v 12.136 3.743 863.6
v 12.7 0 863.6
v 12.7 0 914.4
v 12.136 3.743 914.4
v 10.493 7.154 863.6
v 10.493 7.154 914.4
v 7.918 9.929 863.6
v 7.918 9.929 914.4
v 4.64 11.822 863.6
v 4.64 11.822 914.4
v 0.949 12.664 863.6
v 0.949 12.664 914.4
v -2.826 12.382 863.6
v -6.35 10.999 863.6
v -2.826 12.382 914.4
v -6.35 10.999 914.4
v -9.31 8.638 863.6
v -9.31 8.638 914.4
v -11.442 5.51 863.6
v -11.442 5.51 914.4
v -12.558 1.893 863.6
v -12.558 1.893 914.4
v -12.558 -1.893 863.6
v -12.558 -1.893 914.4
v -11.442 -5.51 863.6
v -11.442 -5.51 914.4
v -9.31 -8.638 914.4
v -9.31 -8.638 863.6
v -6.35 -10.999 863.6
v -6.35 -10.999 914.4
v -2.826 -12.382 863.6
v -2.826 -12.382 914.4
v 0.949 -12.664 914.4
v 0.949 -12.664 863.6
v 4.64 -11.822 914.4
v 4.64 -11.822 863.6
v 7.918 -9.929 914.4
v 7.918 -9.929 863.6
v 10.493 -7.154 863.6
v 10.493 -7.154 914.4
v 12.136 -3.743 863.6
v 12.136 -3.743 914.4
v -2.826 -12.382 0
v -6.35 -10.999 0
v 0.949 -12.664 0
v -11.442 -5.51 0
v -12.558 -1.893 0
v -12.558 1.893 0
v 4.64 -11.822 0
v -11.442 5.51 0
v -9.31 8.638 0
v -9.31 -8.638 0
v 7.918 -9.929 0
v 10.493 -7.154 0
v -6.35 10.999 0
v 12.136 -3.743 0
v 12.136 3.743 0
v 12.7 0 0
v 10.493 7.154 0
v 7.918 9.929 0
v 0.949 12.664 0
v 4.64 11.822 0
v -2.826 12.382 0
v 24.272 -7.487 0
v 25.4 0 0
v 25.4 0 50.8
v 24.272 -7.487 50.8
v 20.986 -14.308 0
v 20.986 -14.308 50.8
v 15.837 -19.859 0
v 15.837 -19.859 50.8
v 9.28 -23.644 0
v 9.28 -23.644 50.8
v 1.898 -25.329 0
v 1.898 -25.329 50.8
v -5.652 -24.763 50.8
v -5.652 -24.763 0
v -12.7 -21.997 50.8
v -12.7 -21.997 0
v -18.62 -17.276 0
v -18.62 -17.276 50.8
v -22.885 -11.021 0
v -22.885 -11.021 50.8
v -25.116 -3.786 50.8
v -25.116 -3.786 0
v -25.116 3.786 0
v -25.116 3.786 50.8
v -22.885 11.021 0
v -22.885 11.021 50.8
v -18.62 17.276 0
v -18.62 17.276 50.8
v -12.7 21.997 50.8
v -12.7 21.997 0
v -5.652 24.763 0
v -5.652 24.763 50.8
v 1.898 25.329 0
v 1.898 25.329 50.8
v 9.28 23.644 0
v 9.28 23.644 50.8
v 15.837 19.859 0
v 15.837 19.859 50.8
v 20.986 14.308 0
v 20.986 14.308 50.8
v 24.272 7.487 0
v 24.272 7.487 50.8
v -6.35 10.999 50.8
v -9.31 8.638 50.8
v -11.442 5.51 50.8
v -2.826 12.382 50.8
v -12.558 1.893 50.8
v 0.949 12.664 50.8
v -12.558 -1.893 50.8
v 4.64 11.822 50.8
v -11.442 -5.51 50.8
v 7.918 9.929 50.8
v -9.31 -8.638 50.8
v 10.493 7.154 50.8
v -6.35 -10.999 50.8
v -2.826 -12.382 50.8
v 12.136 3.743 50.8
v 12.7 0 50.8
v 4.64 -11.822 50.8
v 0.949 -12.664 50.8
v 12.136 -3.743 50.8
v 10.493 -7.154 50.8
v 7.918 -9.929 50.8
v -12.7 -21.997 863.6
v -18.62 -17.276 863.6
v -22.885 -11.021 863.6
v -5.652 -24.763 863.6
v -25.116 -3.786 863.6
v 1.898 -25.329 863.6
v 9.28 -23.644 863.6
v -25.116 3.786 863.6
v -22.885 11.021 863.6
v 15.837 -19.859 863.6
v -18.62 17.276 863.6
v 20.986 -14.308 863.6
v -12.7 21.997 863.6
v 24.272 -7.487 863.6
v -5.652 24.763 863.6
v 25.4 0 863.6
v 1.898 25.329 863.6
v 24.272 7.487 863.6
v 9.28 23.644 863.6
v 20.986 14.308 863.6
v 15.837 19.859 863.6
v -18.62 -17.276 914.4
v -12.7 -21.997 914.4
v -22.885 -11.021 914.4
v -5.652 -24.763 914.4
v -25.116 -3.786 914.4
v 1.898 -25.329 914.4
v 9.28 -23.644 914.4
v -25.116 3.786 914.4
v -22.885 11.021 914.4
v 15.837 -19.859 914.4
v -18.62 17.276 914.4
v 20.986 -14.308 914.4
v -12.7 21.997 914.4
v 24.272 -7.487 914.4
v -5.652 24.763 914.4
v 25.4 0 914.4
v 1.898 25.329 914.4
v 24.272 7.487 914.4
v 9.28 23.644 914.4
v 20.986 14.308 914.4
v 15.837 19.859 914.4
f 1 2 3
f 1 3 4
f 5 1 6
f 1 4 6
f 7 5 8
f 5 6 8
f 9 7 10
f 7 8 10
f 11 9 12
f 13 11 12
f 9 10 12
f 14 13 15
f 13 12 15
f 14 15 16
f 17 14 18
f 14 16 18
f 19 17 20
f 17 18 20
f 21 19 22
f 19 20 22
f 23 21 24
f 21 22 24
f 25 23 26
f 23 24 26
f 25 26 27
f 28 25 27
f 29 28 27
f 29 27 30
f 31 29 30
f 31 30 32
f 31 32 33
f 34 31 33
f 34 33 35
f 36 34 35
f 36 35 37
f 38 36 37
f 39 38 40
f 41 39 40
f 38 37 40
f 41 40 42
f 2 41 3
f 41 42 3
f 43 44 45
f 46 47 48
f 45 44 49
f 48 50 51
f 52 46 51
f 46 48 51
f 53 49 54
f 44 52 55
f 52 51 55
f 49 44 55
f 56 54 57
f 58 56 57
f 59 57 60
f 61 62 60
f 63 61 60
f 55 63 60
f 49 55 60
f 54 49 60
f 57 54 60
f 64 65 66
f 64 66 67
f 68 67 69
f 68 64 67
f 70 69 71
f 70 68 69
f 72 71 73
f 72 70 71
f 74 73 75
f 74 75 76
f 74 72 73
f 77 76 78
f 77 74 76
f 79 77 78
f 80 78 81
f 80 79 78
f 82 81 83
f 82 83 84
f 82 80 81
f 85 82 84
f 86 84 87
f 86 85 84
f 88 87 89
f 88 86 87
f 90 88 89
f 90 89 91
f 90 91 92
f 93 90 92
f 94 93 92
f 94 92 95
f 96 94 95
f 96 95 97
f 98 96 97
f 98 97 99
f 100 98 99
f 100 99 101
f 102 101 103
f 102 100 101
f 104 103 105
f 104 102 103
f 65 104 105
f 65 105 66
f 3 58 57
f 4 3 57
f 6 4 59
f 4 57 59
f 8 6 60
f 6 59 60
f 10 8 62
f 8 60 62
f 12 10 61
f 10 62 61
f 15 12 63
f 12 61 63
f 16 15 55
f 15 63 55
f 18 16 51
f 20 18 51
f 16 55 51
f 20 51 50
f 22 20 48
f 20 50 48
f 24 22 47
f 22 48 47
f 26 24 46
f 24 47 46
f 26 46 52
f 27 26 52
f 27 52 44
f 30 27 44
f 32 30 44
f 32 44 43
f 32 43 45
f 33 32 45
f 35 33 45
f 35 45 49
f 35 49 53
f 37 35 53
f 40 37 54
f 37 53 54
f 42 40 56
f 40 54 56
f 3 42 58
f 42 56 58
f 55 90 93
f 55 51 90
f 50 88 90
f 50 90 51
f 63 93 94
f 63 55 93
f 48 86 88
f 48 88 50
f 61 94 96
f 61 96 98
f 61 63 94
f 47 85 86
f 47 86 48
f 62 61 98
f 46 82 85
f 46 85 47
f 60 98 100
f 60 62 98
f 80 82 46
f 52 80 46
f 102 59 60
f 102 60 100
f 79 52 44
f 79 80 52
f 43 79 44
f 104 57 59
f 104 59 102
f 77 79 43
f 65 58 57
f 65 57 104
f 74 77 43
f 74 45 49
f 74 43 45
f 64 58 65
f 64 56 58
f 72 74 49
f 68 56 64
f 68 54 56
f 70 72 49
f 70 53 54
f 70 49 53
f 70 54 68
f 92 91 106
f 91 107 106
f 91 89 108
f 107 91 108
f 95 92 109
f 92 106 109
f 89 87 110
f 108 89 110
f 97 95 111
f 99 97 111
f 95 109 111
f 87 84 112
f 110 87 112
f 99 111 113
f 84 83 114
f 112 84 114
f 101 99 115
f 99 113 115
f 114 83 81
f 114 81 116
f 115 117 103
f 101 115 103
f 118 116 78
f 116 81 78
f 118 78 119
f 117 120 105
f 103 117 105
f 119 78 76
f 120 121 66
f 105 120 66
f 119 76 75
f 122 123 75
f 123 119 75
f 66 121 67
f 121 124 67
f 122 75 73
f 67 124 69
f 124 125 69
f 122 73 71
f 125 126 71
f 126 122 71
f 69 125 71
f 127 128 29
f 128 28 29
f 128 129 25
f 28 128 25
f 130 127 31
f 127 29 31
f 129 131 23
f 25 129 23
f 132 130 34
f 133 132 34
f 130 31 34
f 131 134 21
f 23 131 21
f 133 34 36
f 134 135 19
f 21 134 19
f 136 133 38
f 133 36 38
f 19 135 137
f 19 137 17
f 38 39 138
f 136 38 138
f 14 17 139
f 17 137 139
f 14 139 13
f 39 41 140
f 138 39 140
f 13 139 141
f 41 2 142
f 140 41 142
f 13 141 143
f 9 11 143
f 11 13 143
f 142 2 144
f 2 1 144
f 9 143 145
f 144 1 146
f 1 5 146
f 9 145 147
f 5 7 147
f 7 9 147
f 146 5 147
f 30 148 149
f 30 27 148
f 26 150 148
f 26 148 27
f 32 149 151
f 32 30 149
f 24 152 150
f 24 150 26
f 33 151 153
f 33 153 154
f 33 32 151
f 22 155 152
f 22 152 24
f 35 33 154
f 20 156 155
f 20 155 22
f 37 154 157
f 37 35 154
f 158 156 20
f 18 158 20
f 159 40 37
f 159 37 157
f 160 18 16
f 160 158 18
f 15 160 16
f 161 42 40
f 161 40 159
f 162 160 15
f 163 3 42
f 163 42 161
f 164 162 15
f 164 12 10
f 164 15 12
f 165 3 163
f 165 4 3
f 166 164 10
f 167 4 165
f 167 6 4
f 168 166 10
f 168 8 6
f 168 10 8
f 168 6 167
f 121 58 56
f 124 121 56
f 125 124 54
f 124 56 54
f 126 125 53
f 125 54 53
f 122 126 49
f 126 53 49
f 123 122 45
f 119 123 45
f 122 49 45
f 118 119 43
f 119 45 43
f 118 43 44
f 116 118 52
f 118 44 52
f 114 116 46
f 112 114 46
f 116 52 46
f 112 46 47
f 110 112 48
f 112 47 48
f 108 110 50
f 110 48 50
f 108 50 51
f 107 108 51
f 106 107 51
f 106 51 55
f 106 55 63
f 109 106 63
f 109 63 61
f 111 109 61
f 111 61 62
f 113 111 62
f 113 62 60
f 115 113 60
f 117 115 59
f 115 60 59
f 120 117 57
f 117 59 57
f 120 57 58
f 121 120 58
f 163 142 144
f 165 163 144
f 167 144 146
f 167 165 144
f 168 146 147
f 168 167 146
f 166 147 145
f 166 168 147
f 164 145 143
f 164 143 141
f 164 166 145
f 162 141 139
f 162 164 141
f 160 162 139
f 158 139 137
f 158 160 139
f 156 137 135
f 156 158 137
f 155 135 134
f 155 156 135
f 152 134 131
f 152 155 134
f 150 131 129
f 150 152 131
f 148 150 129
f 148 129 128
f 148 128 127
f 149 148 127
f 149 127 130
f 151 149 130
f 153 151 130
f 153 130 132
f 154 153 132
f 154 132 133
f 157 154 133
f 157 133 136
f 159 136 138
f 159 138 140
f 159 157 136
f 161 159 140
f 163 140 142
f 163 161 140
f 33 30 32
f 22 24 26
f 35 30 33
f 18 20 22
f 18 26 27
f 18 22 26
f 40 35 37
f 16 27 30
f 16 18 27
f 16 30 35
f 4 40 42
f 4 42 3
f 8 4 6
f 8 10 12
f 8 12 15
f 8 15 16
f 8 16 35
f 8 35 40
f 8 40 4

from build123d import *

# Parameters (mm, degrees)
F0_R     = 12.7
F1_DEPTH = 914.4
F2_R     = 25.4
F2_R_2   = 12.7
F3_DEPTH = 50.8
F4_R     = 25.4
F4_R_2   = 12.7
F5_DEPTH = 50.8


with BuildPart() as f1:
    # F0 (on Top) → F1 (new body)
    with BuildSketch(Plane.XY):
        Circle(F0_R)
    extrude(amount=F1_DEPTH)


with BuildPart() as f3:
    # F2 (on face) → F3 (new body)
    with BuildSketch(Plane(origin=(0, 0, 0), x_dir=(1, 0, 0), z_dir=(0, 0, -1))):
        Circle(F2_R)
        Circle(F2_R_2, mode=Mode.SUBTRACT)
    extrude(amount=-F3_DEPTH)


with BuildPart() as f5:
    # F4 (on face) → F5 (new body)
    with BuildSketch(Plane.XY.offset(914.4)):
        Circle(F4_R)
        Circle(F4_R_2, mode=Mode.SUBTRACT)
    extrude(amount=-F5_DEPTH)


solid = Compound([f1.part, f3.part, f5.part])
